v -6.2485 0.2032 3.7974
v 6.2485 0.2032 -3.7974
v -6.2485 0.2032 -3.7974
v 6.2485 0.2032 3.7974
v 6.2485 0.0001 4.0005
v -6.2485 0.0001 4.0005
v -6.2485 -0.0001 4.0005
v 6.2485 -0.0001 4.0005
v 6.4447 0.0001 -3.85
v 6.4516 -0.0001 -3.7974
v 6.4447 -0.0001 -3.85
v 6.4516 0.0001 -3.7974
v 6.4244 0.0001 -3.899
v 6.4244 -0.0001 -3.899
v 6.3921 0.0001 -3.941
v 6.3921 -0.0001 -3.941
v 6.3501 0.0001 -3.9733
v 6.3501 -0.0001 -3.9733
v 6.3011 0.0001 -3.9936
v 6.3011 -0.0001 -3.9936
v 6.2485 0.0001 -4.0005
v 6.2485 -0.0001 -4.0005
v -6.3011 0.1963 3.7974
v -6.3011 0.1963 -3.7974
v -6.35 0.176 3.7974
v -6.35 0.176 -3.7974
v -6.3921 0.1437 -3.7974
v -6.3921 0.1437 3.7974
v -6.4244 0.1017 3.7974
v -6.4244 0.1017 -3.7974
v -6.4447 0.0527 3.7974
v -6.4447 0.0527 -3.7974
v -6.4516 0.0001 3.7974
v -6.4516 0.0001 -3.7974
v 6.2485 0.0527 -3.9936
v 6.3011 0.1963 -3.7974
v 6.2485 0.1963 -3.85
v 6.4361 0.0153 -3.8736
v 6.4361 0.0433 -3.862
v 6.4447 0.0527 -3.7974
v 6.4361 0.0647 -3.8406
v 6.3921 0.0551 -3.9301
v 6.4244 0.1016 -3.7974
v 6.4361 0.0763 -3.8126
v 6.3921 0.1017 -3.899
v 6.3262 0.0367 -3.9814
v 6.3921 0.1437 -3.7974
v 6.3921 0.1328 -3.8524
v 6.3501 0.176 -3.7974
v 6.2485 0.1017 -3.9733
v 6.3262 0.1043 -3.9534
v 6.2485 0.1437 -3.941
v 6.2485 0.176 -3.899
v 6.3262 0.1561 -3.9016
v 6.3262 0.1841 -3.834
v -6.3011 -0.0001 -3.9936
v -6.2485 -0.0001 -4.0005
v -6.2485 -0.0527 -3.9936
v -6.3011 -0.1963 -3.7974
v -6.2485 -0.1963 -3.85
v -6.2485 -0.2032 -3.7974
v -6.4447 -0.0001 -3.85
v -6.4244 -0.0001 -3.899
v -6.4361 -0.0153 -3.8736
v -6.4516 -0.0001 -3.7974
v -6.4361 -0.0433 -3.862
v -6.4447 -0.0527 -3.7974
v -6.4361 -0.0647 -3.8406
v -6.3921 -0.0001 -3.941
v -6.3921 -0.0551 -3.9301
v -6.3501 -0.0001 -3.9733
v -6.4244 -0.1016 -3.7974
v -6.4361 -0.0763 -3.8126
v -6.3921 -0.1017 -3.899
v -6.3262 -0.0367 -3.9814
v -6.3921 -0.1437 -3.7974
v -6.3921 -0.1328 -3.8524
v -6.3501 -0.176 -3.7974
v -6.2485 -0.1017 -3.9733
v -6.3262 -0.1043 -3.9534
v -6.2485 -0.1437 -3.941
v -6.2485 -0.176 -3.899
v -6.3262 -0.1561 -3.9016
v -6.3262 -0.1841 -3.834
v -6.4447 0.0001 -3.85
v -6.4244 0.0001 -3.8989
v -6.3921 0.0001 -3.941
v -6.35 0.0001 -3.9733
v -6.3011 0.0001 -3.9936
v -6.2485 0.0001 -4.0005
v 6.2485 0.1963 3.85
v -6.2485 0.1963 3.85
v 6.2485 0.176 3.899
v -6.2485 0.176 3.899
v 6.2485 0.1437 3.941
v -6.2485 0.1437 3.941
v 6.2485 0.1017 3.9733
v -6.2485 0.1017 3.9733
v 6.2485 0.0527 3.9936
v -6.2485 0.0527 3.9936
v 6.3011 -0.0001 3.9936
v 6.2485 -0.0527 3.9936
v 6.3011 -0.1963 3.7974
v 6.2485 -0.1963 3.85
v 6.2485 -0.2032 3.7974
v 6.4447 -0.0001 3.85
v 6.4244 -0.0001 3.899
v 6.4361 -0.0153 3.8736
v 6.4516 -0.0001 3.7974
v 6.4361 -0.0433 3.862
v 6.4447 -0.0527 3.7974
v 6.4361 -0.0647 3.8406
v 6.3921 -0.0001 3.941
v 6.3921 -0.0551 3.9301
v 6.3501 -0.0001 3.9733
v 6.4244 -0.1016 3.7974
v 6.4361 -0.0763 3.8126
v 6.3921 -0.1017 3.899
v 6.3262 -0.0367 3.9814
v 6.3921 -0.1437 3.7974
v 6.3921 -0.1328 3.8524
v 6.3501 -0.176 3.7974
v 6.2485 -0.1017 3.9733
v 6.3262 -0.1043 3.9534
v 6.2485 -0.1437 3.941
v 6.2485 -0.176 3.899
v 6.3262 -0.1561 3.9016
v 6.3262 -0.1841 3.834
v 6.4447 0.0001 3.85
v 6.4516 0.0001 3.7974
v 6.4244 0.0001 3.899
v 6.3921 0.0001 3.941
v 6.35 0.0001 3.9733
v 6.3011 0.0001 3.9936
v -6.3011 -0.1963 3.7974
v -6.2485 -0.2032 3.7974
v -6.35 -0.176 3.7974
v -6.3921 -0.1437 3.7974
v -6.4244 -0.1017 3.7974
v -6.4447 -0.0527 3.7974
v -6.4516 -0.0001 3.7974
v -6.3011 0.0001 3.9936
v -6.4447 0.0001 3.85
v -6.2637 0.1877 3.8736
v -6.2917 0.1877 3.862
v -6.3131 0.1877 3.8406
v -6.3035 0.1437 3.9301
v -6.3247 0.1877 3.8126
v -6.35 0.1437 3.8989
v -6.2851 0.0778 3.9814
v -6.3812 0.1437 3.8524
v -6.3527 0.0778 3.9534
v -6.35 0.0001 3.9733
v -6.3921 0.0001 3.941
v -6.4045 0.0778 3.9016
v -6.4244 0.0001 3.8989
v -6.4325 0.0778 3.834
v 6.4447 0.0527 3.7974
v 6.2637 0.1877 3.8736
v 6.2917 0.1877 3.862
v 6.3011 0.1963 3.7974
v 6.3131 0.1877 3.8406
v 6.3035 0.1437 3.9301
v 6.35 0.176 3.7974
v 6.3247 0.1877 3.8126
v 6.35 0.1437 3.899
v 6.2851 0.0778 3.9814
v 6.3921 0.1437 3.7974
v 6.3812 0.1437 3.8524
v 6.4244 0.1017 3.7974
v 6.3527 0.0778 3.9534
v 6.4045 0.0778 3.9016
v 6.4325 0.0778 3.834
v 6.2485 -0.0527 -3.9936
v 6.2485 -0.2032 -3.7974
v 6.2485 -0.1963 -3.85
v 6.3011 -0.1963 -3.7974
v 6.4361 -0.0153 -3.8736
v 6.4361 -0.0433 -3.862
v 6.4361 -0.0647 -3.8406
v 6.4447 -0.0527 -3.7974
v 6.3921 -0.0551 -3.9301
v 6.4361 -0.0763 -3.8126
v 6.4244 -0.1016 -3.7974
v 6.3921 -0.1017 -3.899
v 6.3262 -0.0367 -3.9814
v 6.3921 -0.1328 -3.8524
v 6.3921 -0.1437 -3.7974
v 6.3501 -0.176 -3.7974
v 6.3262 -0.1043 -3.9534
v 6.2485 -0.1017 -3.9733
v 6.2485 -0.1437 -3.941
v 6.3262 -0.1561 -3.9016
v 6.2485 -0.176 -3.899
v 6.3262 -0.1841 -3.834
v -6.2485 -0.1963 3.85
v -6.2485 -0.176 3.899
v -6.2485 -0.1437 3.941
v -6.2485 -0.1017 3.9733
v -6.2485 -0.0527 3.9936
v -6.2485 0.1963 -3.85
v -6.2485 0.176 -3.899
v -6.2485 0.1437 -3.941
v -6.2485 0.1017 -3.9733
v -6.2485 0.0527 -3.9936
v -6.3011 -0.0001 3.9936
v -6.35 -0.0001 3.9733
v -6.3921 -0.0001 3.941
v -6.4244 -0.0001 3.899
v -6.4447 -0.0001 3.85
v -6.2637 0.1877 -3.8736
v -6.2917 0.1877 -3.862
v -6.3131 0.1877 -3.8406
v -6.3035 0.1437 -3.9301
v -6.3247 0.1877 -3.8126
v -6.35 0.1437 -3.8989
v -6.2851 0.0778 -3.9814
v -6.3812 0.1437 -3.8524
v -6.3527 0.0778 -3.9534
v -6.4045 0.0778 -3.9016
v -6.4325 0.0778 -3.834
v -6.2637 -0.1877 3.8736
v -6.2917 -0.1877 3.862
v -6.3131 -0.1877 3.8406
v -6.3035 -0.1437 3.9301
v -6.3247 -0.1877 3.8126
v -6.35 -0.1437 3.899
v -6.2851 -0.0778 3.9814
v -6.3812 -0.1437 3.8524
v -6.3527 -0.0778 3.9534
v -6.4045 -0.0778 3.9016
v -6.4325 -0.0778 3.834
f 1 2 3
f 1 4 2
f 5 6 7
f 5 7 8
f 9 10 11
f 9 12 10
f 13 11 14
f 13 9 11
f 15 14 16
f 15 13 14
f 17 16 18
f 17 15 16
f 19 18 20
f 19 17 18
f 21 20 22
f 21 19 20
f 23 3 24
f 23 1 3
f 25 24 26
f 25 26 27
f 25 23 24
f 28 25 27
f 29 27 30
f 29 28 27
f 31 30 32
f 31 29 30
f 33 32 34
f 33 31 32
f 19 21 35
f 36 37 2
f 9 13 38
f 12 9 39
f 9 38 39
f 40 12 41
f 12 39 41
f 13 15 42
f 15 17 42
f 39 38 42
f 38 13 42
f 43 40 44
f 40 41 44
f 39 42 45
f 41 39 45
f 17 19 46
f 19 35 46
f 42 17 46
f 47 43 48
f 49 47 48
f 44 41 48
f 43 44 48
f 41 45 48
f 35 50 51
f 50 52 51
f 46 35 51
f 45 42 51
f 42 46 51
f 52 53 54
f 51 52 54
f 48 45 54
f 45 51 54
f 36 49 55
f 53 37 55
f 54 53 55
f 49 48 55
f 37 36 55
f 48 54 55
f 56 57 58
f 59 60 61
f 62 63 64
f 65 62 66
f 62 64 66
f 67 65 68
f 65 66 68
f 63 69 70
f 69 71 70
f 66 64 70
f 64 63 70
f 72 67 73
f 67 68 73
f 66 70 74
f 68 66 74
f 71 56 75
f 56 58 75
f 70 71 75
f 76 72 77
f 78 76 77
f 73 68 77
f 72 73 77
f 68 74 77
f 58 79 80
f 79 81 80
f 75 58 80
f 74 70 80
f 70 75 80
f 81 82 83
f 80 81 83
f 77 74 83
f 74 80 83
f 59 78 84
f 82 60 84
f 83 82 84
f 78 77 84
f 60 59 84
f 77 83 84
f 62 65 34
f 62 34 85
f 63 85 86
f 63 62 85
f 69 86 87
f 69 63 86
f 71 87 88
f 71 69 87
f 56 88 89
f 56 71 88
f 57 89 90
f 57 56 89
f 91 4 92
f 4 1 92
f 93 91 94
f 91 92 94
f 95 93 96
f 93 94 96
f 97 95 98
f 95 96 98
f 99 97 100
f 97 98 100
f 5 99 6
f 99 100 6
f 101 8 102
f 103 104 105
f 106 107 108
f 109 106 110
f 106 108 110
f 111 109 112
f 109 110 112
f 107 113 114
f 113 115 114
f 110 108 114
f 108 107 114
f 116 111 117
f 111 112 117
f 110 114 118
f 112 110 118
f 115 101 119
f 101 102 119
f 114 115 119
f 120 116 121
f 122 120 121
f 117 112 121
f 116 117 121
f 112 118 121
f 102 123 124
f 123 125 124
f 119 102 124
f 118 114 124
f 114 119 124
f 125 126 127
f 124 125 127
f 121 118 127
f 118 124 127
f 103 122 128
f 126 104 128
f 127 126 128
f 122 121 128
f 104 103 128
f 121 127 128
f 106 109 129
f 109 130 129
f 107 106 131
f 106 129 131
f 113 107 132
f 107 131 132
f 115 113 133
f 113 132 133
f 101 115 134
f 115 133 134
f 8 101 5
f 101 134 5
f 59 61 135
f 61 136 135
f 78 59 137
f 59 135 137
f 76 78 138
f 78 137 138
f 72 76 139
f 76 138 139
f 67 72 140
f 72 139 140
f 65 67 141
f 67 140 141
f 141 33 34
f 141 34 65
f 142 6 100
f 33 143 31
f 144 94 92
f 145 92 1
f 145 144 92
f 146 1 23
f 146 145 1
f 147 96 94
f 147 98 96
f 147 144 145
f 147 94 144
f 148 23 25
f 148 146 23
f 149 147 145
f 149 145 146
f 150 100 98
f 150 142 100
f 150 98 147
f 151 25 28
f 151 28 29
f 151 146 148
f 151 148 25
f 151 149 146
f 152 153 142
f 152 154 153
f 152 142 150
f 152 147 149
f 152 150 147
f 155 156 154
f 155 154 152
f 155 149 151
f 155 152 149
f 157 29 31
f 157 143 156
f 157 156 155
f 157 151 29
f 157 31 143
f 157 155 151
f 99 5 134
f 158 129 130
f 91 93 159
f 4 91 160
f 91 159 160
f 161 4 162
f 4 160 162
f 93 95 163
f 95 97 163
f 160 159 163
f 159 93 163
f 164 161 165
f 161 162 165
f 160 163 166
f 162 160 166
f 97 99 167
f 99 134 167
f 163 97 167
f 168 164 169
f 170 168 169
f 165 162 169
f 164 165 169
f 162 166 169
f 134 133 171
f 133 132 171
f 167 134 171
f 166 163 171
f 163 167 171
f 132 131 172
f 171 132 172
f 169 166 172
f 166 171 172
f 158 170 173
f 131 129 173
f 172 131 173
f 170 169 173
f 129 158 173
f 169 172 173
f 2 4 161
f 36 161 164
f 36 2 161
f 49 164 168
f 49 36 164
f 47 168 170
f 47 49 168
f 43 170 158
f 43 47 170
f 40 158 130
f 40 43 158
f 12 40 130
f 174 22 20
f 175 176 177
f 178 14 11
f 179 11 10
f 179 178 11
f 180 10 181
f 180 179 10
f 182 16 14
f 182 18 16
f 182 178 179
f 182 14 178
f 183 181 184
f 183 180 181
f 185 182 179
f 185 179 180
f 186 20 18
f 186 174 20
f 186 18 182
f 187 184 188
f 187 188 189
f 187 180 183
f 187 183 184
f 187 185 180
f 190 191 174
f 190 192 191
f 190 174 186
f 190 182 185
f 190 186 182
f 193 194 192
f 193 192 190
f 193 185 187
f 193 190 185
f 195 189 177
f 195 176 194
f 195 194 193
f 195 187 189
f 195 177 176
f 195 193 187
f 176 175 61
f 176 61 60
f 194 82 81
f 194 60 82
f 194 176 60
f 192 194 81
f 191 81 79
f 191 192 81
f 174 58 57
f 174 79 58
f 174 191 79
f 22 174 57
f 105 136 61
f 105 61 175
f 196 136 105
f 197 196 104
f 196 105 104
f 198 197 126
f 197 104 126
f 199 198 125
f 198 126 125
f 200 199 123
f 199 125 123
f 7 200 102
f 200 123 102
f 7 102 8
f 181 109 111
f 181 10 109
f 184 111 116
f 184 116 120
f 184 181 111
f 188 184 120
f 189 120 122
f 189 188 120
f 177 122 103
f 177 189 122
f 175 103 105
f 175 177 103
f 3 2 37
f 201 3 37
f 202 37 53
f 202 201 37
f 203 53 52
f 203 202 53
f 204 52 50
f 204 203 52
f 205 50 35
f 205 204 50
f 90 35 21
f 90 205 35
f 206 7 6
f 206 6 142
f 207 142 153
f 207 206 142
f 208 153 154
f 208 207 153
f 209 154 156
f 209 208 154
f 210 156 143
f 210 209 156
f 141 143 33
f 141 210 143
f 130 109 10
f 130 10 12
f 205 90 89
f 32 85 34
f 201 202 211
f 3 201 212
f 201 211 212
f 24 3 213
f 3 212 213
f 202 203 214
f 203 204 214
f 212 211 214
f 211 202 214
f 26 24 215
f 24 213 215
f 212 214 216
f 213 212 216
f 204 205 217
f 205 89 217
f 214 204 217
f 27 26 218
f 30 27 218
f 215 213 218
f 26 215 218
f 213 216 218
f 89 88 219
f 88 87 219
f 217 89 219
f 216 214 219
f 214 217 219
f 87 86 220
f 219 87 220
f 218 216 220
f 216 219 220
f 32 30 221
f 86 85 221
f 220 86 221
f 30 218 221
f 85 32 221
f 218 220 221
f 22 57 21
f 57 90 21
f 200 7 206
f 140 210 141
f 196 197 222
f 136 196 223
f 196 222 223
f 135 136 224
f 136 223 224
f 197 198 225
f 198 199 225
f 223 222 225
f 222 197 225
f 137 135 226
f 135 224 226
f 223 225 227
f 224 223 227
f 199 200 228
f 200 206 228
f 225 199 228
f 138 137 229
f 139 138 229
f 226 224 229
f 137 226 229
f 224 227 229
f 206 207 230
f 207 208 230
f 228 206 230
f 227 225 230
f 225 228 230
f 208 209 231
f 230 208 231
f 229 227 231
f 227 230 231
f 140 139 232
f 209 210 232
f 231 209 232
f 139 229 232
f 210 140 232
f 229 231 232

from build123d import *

# Parameters (mm, degrees)
BOSS_EXTRUDE1_DEPTH = 4.0005
FILLET3_R           = 0.2032


with BuildPart() as part:
    # Sketch1 → Boss-Extrude1 (new, symmetric)
    with BuildSketch(Plane.XY):
        Polygon((6.4516, 0.2032), (-6.4516, 0.2032), (-6.4516, -0.2032), (-6.0452, -0.2032), (6.0452, -0.2032), (6.4516, -0.2032), align=None)
    extrude(amount=BOSS_EXTRUDE1_DEPTH, both=True)

    # Fillet3
    fillet3_edges = [part.edges().sort_by_distance(p)[0] for p in [
        (-6.4516, 0, 4.0005),
        (0, -0.2032, 4.0005),
        (6.4516, 0, 4.0005),
        (0, -0.2032, -4.0005),
        (-6.4516, 0, -4.0005),
        (0, 0.2032, -4.0005),
        (6.4516, 0, -4.0005),
        (0, 0.2032, 4.0005),
        (6.4516, -0.2032, 0),
        (-6.4516, -0.2032, 0),
        (-6.4516, 0.2032, 0),
        (6.4516, 0.2032, 0),
    ]]
    fillet(fillet3_edges, radius=FILLET3_R - 0.0001)  # a hair under: the kernel refuses the full size


solid = part.part
